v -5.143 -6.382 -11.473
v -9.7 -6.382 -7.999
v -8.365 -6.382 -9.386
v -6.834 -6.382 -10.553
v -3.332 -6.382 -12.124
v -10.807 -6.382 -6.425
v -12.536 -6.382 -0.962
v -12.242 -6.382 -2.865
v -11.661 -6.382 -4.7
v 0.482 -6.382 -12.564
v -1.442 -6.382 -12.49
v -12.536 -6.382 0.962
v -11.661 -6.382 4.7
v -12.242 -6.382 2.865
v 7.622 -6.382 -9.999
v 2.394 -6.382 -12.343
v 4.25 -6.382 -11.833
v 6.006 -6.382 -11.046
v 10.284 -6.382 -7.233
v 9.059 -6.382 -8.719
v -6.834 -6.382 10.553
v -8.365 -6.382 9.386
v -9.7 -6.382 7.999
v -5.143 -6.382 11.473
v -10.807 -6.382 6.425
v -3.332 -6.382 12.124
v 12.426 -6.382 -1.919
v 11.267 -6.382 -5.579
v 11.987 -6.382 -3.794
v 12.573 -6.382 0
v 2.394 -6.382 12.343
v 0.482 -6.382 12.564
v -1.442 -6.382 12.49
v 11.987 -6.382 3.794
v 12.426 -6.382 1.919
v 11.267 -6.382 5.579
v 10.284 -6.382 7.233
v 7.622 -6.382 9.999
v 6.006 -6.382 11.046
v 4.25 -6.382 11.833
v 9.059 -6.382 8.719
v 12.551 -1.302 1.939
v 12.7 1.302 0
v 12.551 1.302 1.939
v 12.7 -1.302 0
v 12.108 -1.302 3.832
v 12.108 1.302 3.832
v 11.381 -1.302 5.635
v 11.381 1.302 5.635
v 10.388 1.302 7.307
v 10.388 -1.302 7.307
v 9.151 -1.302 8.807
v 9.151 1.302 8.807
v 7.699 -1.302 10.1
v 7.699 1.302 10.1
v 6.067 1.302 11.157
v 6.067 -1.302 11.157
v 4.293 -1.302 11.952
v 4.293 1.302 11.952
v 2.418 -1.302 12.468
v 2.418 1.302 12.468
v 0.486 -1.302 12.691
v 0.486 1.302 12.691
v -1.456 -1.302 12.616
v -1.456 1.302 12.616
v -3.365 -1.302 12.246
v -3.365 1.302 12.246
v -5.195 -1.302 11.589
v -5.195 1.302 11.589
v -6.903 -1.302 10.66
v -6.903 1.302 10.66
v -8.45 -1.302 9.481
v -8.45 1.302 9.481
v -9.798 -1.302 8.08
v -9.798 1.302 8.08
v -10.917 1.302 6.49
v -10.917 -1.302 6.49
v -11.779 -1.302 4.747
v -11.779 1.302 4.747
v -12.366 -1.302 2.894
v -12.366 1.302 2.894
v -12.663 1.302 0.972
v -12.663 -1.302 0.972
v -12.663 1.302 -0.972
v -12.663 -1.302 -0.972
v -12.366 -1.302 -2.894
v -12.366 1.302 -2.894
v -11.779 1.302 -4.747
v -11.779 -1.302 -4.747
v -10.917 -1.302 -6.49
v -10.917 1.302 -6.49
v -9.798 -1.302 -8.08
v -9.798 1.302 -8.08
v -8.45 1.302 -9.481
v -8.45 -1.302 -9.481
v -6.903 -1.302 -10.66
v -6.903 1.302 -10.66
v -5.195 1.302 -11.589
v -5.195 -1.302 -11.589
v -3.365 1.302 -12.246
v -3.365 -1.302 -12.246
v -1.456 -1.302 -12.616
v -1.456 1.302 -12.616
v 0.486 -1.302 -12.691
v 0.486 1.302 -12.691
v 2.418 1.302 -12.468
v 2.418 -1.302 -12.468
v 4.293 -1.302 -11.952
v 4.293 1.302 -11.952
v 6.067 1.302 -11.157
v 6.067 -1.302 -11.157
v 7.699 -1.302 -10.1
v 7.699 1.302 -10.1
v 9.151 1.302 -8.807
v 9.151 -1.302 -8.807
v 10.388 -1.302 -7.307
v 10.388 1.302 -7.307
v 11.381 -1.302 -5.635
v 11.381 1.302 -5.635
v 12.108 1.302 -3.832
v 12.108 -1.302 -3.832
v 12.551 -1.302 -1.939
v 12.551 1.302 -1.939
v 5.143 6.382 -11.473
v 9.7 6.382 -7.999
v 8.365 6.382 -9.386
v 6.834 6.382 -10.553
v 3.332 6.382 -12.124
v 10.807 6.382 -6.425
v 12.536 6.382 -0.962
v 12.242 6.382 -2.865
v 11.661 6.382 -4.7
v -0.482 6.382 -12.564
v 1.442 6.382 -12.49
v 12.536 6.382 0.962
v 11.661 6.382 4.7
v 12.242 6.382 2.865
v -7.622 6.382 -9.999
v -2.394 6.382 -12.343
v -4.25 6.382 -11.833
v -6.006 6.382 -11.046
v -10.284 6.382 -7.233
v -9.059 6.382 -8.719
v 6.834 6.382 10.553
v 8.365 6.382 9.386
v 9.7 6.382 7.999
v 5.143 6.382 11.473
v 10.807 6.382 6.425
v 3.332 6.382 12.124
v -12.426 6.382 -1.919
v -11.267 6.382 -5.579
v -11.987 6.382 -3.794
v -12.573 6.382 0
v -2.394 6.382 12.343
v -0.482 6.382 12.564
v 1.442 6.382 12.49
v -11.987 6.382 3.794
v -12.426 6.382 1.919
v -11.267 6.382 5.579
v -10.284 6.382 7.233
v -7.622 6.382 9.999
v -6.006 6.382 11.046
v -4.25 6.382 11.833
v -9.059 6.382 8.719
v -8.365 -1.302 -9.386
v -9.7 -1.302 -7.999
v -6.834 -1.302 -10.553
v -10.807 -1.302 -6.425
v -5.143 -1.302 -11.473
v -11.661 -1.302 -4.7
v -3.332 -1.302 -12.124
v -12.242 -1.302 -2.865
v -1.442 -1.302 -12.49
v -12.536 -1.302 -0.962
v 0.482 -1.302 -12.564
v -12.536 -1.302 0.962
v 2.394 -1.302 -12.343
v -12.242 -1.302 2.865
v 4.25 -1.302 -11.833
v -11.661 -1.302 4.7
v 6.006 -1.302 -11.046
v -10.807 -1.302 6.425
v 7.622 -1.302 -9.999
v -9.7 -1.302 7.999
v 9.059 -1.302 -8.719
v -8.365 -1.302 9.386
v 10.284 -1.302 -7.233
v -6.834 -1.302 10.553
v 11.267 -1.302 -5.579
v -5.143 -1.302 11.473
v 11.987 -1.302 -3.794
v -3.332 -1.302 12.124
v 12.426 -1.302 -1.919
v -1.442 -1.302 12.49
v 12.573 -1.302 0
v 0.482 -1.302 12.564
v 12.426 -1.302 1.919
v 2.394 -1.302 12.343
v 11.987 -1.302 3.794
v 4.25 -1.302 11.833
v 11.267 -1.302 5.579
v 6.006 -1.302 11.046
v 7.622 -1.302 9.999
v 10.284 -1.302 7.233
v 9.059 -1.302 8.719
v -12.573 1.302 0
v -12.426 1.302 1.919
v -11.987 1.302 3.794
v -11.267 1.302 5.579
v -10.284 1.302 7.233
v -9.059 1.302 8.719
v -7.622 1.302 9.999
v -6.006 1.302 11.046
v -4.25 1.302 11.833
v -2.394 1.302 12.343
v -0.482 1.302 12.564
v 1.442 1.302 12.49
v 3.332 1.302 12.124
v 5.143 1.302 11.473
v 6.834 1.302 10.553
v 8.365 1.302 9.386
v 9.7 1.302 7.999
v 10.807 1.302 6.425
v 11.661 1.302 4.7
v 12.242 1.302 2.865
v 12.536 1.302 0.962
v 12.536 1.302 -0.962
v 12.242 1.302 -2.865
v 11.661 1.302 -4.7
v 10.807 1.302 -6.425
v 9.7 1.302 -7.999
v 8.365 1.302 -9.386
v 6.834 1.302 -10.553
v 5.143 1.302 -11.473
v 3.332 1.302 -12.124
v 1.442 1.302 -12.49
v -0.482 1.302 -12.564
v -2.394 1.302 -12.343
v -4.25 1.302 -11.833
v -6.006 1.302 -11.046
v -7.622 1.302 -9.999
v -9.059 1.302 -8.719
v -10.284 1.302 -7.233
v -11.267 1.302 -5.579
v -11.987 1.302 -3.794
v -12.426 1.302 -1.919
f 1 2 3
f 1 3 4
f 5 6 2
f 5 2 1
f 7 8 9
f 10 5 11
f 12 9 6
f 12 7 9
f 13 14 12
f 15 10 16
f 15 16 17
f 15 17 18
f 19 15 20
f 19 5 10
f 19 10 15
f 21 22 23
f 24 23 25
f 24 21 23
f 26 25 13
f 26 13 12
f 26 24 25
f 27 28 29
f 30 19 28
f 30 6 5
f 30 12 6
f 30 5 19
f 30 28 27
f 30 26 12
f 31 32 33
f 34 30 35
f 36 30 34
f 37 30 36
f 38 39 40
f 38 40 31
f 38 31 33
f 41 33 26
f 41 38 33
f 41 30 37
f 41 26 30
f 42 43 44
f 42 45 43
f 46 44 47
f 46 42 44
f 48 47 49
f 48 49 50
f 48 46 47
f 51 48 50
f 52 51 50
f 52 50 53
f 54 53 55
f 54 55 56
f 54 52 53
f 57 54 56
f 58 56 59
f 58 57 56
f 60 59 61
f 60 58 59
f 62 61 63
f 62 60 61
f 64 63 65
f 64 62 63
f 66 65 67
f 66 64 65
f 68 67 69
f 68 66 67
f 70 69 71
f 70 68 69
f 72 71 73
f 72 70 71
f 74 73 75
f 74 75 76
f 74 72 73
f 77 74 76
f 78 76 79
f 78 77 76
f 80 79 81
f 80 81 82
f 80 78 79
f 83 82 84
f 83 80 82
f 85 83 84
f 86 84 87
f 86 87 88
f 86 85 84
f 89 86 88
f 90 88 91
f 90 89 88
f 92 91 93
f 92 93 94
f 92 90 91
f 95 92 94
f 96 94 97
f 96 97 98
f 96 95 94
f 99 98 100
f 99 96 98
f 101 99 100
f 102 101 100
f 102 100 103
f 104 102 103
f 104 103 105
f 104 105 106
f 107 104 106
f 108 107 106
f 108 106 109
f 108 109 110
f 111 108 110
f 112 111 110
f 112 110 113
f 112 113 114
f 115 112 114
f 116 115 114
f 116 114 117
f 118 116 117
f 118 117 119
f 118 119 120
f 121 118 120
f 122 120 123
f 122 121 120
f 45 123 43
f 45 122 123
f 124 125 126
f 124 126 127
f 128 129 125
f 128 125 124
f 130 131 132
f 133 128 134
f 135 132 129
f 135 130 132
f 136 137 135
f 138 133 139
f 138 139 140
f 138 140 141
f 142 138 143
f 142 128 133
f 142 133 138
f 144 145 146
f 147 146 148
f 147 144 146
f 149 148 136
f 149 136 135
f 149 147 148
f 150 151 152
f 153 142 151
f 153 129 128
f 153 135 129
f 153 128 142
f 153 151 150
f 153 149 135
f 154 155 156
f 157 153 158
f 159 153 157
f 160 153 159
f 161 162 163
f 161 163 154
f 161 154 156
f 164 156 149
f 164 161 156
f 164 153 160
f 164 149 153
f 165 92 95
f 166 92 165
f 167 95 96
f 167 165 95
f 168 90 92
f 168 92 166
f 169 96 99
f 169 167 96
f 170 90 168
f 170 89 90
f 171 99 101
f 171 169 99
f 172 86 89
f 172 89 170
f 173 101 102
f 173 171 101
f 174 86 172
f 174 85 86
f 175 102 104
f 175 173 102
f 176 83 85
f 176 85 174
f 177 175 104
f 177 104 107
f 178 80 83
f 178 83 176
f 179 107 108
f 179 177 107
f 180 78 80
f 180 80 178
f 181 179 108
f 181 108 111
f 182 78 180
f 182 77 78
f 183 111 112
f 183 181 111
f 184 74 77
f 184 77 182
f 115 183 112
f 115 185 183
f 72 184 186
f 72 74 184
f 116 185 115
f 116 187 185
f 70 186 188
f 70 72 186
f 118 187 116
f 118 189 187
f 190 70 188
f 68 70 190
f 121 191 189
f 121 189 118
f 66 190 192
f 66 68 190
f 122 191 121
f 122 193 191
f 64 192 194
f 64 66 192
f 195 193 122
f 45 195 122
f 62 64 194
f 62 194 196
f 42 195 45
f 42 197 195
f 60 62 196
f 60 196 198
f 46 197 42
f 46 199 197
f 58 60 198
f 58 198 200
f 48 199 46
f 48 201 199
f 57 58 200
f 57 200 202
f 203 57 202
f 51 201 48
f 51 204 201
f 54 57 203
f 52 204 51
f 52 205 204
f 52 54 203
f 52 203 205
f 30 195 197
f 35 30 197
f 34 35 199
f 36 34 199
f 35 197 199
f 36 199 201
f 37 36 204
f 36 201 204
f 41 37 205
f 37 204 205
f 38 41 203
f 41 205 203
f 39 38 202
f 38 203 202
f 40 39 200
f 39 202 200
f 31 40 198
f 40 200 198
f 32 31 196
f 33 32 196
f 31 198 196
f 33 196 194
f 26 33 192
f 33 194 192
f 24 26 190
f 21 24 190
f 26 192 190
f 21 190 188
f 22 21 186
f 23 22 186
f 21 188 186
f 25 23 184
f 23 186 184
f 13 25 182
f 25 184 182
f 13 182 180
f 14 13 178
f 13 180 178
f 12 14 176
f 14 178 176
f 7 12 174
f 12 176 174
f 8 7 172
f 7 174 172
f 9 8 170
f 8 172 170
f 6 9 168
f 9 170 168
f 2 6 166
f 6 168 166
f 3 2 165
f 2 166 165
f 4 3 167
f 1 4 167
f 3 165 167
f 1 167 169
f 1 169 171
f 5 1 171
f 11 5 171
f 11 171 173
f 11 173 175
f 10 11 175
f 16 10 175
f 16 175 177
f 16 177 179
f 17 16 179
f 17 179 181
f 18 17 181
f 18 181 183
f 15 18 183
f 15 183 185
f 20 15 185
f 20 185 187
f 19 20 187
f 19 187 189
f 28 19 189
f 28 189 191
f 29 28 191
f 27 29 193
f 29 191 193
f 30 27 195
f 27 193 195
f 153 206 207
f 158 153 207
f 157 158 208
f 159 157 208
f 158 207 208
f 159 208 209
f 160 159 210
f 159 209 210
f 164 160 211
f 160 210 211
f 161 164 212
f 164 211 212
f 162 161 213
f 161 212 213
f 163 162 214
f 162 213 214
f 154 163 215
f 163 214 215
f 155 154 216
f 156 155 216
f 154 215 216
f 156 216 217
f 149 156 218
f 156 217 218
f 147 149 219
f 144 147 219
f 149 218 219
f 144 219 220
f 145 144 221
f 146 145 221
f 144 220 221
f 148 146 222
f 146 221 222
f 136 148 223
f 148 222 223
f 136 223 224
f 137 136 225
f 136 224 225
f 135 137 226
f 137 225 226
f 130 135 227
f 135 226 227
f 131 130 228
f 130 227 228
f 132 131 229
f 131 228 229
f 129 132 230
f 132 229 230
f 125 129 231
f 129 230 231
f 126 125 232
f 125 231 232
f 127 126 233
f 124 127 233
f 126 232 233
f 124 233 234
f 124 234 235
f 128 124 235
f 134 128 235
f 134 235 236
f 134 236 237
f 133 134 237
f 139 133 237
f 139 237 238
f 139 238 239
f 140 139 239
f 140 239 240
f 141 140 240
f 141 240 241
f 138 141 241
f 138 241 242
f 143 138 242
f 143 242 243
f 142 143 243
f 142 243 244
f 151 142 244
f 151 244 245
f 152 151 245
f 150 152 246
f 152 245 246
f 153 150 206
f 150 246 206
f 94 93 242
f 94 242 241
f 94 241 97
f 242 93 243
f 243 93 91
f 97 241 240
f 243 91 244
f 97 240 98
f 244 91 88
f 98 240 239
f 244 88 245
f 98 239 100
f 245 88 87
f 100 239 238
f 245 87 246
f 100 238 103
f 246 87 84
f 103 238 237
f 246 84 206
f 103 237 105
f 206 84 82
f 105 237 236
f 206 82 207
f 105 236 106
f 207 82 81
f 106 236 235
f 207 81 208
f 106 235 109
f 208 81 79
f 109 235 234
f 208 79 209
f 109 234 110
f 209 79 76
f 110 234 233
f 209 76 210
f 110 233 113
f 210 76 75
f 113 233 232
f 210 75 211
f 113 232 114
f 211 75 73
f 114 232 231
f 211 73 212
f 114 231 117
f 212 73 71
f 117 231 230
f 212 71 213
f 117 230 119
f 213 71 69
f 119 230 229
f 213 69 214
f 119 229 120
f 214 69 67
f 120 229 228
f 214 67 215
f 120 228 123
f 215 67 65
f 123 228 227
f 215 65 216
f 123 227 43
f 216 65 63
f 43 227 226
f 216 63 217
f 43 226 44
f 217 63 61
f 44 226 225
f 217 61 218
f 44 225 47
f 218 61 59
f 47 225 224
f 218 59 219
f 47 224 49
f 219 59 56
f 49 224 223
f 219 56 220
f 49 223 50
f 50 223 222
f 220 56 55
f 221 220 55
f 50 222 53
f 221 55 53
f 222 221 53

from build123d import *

# Parameters (mm, degrees)
F0_R          = 12.7
F1_DEPTH      = 1.30175
F1_DEPTH_BACK = 1.30175
F2_R          = 12.573
F3_DEPTH      = 5.08
F4_R          = 12.573
F5_DEPTH      = 5.08


with BuildPart() as f1:
    # F0 (on Front) → F1 (new body, two sides)
    with BuildSketch(Plane.XZ) as f1_sk:
        Circle(F0_R)
    extrude(amount=F1_DEPTH)
    extrude(f1_sk.sketch, amount=-F1_DEPTH_BACK)

    # F2 (on face) → F3 (join)
    with BuildSketch(Plane.XZ.offset(1.30175)):
        Circle(F2_R)
    extrude(amount=F3_DEPTH)

    # F4 (on face) → F5 (join)
    with BuildSketch(Plane(origin=(0, 1.30175, 0), x_dir=(-1, 0, 0), z_dir=(0, 1, 0))):
        Circle(F4_R)
    extrude(amount=F5_DEPTH)


solid = f1.part
